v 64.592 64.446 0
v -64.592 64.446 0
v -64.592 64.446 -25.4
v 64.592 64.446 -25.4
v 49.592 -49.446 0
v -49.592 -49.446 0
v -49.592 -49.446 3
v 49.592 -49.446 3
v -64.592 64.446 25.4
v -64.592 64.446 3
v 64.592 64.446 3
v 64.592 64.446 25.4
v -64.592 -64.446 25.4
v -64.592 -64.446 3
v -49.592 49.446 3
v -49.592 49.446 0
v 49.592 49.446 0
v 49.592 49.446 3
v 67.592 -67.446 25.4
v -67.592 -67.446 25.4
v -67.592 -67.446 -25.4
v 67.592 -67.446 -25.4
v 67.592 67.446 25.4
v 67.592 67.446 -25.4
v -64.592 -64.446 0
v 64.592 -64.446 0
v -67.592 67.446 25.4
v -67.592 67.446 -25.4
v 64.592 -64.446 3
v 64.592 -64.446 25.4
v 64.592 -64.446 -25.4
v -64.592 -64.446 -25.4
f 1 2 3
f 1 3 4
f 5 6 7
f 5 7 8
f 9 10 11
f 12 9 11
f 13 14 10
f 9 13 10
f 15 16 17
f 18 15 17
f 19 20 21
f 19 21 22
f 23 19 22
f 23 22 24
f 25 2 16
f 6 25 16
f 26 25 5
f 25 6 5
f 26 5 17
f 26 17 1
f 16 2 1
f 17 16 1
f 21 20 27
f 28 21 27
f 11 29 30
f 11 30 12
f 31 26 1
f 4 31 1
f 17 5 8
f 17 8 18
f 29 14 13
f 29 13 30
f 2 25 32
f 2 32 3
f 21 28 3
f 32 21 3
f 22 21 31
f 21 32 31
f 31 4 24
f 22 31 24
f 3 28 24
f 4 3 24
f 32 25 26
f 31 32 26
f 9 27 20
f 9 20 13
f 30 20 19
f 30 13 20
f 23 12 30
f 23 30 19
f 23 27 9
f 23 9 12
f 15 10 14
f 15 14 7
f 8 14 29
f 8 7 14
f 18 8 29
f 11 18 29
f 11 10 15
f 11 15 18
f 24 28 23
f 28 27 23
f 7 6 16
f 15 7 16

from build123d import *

# Parameters (mm, degrees)
F0_W          = 129.1844
F0_H          = 128.892914
F0_W_2        = 99.1844
F0_H_2        = 98.892914
F1_DEPTH      = 3
F2_W          = 135.1844
F2_H          = 134.892914
F2_W_2        = 129.1844
F2_H_2        = 128.892914
F3_DEPTH      = 25.4
F3_DEPTH_BACK = 25.4


with BuildPart() as f1:
    # F0 (on Top) → F1 (new body)
    with BuildSketch(Plane.XY):
        Rectangle(F0_W, F0_H)
        Rectangle(F0_W_2, F0_H_2, mode=Mode.SUBTRACT)
    extrude(amount=F1_DEPTH)

    # F2 (on Top) → F3 (join, two sides)
    with BuildSketch(Plane.XY) as f3_sk:
        Rectangle(F2_W, F2_H)
        Rectangle(F2_W_2, F2_H_2, mode=Mode.SUBTRACT)
    extrude(amount=F3_DEPTH)
    extrude(f3_sk.sketch, amount=-F3_DEPTH_BACK)


solid = f1.part
